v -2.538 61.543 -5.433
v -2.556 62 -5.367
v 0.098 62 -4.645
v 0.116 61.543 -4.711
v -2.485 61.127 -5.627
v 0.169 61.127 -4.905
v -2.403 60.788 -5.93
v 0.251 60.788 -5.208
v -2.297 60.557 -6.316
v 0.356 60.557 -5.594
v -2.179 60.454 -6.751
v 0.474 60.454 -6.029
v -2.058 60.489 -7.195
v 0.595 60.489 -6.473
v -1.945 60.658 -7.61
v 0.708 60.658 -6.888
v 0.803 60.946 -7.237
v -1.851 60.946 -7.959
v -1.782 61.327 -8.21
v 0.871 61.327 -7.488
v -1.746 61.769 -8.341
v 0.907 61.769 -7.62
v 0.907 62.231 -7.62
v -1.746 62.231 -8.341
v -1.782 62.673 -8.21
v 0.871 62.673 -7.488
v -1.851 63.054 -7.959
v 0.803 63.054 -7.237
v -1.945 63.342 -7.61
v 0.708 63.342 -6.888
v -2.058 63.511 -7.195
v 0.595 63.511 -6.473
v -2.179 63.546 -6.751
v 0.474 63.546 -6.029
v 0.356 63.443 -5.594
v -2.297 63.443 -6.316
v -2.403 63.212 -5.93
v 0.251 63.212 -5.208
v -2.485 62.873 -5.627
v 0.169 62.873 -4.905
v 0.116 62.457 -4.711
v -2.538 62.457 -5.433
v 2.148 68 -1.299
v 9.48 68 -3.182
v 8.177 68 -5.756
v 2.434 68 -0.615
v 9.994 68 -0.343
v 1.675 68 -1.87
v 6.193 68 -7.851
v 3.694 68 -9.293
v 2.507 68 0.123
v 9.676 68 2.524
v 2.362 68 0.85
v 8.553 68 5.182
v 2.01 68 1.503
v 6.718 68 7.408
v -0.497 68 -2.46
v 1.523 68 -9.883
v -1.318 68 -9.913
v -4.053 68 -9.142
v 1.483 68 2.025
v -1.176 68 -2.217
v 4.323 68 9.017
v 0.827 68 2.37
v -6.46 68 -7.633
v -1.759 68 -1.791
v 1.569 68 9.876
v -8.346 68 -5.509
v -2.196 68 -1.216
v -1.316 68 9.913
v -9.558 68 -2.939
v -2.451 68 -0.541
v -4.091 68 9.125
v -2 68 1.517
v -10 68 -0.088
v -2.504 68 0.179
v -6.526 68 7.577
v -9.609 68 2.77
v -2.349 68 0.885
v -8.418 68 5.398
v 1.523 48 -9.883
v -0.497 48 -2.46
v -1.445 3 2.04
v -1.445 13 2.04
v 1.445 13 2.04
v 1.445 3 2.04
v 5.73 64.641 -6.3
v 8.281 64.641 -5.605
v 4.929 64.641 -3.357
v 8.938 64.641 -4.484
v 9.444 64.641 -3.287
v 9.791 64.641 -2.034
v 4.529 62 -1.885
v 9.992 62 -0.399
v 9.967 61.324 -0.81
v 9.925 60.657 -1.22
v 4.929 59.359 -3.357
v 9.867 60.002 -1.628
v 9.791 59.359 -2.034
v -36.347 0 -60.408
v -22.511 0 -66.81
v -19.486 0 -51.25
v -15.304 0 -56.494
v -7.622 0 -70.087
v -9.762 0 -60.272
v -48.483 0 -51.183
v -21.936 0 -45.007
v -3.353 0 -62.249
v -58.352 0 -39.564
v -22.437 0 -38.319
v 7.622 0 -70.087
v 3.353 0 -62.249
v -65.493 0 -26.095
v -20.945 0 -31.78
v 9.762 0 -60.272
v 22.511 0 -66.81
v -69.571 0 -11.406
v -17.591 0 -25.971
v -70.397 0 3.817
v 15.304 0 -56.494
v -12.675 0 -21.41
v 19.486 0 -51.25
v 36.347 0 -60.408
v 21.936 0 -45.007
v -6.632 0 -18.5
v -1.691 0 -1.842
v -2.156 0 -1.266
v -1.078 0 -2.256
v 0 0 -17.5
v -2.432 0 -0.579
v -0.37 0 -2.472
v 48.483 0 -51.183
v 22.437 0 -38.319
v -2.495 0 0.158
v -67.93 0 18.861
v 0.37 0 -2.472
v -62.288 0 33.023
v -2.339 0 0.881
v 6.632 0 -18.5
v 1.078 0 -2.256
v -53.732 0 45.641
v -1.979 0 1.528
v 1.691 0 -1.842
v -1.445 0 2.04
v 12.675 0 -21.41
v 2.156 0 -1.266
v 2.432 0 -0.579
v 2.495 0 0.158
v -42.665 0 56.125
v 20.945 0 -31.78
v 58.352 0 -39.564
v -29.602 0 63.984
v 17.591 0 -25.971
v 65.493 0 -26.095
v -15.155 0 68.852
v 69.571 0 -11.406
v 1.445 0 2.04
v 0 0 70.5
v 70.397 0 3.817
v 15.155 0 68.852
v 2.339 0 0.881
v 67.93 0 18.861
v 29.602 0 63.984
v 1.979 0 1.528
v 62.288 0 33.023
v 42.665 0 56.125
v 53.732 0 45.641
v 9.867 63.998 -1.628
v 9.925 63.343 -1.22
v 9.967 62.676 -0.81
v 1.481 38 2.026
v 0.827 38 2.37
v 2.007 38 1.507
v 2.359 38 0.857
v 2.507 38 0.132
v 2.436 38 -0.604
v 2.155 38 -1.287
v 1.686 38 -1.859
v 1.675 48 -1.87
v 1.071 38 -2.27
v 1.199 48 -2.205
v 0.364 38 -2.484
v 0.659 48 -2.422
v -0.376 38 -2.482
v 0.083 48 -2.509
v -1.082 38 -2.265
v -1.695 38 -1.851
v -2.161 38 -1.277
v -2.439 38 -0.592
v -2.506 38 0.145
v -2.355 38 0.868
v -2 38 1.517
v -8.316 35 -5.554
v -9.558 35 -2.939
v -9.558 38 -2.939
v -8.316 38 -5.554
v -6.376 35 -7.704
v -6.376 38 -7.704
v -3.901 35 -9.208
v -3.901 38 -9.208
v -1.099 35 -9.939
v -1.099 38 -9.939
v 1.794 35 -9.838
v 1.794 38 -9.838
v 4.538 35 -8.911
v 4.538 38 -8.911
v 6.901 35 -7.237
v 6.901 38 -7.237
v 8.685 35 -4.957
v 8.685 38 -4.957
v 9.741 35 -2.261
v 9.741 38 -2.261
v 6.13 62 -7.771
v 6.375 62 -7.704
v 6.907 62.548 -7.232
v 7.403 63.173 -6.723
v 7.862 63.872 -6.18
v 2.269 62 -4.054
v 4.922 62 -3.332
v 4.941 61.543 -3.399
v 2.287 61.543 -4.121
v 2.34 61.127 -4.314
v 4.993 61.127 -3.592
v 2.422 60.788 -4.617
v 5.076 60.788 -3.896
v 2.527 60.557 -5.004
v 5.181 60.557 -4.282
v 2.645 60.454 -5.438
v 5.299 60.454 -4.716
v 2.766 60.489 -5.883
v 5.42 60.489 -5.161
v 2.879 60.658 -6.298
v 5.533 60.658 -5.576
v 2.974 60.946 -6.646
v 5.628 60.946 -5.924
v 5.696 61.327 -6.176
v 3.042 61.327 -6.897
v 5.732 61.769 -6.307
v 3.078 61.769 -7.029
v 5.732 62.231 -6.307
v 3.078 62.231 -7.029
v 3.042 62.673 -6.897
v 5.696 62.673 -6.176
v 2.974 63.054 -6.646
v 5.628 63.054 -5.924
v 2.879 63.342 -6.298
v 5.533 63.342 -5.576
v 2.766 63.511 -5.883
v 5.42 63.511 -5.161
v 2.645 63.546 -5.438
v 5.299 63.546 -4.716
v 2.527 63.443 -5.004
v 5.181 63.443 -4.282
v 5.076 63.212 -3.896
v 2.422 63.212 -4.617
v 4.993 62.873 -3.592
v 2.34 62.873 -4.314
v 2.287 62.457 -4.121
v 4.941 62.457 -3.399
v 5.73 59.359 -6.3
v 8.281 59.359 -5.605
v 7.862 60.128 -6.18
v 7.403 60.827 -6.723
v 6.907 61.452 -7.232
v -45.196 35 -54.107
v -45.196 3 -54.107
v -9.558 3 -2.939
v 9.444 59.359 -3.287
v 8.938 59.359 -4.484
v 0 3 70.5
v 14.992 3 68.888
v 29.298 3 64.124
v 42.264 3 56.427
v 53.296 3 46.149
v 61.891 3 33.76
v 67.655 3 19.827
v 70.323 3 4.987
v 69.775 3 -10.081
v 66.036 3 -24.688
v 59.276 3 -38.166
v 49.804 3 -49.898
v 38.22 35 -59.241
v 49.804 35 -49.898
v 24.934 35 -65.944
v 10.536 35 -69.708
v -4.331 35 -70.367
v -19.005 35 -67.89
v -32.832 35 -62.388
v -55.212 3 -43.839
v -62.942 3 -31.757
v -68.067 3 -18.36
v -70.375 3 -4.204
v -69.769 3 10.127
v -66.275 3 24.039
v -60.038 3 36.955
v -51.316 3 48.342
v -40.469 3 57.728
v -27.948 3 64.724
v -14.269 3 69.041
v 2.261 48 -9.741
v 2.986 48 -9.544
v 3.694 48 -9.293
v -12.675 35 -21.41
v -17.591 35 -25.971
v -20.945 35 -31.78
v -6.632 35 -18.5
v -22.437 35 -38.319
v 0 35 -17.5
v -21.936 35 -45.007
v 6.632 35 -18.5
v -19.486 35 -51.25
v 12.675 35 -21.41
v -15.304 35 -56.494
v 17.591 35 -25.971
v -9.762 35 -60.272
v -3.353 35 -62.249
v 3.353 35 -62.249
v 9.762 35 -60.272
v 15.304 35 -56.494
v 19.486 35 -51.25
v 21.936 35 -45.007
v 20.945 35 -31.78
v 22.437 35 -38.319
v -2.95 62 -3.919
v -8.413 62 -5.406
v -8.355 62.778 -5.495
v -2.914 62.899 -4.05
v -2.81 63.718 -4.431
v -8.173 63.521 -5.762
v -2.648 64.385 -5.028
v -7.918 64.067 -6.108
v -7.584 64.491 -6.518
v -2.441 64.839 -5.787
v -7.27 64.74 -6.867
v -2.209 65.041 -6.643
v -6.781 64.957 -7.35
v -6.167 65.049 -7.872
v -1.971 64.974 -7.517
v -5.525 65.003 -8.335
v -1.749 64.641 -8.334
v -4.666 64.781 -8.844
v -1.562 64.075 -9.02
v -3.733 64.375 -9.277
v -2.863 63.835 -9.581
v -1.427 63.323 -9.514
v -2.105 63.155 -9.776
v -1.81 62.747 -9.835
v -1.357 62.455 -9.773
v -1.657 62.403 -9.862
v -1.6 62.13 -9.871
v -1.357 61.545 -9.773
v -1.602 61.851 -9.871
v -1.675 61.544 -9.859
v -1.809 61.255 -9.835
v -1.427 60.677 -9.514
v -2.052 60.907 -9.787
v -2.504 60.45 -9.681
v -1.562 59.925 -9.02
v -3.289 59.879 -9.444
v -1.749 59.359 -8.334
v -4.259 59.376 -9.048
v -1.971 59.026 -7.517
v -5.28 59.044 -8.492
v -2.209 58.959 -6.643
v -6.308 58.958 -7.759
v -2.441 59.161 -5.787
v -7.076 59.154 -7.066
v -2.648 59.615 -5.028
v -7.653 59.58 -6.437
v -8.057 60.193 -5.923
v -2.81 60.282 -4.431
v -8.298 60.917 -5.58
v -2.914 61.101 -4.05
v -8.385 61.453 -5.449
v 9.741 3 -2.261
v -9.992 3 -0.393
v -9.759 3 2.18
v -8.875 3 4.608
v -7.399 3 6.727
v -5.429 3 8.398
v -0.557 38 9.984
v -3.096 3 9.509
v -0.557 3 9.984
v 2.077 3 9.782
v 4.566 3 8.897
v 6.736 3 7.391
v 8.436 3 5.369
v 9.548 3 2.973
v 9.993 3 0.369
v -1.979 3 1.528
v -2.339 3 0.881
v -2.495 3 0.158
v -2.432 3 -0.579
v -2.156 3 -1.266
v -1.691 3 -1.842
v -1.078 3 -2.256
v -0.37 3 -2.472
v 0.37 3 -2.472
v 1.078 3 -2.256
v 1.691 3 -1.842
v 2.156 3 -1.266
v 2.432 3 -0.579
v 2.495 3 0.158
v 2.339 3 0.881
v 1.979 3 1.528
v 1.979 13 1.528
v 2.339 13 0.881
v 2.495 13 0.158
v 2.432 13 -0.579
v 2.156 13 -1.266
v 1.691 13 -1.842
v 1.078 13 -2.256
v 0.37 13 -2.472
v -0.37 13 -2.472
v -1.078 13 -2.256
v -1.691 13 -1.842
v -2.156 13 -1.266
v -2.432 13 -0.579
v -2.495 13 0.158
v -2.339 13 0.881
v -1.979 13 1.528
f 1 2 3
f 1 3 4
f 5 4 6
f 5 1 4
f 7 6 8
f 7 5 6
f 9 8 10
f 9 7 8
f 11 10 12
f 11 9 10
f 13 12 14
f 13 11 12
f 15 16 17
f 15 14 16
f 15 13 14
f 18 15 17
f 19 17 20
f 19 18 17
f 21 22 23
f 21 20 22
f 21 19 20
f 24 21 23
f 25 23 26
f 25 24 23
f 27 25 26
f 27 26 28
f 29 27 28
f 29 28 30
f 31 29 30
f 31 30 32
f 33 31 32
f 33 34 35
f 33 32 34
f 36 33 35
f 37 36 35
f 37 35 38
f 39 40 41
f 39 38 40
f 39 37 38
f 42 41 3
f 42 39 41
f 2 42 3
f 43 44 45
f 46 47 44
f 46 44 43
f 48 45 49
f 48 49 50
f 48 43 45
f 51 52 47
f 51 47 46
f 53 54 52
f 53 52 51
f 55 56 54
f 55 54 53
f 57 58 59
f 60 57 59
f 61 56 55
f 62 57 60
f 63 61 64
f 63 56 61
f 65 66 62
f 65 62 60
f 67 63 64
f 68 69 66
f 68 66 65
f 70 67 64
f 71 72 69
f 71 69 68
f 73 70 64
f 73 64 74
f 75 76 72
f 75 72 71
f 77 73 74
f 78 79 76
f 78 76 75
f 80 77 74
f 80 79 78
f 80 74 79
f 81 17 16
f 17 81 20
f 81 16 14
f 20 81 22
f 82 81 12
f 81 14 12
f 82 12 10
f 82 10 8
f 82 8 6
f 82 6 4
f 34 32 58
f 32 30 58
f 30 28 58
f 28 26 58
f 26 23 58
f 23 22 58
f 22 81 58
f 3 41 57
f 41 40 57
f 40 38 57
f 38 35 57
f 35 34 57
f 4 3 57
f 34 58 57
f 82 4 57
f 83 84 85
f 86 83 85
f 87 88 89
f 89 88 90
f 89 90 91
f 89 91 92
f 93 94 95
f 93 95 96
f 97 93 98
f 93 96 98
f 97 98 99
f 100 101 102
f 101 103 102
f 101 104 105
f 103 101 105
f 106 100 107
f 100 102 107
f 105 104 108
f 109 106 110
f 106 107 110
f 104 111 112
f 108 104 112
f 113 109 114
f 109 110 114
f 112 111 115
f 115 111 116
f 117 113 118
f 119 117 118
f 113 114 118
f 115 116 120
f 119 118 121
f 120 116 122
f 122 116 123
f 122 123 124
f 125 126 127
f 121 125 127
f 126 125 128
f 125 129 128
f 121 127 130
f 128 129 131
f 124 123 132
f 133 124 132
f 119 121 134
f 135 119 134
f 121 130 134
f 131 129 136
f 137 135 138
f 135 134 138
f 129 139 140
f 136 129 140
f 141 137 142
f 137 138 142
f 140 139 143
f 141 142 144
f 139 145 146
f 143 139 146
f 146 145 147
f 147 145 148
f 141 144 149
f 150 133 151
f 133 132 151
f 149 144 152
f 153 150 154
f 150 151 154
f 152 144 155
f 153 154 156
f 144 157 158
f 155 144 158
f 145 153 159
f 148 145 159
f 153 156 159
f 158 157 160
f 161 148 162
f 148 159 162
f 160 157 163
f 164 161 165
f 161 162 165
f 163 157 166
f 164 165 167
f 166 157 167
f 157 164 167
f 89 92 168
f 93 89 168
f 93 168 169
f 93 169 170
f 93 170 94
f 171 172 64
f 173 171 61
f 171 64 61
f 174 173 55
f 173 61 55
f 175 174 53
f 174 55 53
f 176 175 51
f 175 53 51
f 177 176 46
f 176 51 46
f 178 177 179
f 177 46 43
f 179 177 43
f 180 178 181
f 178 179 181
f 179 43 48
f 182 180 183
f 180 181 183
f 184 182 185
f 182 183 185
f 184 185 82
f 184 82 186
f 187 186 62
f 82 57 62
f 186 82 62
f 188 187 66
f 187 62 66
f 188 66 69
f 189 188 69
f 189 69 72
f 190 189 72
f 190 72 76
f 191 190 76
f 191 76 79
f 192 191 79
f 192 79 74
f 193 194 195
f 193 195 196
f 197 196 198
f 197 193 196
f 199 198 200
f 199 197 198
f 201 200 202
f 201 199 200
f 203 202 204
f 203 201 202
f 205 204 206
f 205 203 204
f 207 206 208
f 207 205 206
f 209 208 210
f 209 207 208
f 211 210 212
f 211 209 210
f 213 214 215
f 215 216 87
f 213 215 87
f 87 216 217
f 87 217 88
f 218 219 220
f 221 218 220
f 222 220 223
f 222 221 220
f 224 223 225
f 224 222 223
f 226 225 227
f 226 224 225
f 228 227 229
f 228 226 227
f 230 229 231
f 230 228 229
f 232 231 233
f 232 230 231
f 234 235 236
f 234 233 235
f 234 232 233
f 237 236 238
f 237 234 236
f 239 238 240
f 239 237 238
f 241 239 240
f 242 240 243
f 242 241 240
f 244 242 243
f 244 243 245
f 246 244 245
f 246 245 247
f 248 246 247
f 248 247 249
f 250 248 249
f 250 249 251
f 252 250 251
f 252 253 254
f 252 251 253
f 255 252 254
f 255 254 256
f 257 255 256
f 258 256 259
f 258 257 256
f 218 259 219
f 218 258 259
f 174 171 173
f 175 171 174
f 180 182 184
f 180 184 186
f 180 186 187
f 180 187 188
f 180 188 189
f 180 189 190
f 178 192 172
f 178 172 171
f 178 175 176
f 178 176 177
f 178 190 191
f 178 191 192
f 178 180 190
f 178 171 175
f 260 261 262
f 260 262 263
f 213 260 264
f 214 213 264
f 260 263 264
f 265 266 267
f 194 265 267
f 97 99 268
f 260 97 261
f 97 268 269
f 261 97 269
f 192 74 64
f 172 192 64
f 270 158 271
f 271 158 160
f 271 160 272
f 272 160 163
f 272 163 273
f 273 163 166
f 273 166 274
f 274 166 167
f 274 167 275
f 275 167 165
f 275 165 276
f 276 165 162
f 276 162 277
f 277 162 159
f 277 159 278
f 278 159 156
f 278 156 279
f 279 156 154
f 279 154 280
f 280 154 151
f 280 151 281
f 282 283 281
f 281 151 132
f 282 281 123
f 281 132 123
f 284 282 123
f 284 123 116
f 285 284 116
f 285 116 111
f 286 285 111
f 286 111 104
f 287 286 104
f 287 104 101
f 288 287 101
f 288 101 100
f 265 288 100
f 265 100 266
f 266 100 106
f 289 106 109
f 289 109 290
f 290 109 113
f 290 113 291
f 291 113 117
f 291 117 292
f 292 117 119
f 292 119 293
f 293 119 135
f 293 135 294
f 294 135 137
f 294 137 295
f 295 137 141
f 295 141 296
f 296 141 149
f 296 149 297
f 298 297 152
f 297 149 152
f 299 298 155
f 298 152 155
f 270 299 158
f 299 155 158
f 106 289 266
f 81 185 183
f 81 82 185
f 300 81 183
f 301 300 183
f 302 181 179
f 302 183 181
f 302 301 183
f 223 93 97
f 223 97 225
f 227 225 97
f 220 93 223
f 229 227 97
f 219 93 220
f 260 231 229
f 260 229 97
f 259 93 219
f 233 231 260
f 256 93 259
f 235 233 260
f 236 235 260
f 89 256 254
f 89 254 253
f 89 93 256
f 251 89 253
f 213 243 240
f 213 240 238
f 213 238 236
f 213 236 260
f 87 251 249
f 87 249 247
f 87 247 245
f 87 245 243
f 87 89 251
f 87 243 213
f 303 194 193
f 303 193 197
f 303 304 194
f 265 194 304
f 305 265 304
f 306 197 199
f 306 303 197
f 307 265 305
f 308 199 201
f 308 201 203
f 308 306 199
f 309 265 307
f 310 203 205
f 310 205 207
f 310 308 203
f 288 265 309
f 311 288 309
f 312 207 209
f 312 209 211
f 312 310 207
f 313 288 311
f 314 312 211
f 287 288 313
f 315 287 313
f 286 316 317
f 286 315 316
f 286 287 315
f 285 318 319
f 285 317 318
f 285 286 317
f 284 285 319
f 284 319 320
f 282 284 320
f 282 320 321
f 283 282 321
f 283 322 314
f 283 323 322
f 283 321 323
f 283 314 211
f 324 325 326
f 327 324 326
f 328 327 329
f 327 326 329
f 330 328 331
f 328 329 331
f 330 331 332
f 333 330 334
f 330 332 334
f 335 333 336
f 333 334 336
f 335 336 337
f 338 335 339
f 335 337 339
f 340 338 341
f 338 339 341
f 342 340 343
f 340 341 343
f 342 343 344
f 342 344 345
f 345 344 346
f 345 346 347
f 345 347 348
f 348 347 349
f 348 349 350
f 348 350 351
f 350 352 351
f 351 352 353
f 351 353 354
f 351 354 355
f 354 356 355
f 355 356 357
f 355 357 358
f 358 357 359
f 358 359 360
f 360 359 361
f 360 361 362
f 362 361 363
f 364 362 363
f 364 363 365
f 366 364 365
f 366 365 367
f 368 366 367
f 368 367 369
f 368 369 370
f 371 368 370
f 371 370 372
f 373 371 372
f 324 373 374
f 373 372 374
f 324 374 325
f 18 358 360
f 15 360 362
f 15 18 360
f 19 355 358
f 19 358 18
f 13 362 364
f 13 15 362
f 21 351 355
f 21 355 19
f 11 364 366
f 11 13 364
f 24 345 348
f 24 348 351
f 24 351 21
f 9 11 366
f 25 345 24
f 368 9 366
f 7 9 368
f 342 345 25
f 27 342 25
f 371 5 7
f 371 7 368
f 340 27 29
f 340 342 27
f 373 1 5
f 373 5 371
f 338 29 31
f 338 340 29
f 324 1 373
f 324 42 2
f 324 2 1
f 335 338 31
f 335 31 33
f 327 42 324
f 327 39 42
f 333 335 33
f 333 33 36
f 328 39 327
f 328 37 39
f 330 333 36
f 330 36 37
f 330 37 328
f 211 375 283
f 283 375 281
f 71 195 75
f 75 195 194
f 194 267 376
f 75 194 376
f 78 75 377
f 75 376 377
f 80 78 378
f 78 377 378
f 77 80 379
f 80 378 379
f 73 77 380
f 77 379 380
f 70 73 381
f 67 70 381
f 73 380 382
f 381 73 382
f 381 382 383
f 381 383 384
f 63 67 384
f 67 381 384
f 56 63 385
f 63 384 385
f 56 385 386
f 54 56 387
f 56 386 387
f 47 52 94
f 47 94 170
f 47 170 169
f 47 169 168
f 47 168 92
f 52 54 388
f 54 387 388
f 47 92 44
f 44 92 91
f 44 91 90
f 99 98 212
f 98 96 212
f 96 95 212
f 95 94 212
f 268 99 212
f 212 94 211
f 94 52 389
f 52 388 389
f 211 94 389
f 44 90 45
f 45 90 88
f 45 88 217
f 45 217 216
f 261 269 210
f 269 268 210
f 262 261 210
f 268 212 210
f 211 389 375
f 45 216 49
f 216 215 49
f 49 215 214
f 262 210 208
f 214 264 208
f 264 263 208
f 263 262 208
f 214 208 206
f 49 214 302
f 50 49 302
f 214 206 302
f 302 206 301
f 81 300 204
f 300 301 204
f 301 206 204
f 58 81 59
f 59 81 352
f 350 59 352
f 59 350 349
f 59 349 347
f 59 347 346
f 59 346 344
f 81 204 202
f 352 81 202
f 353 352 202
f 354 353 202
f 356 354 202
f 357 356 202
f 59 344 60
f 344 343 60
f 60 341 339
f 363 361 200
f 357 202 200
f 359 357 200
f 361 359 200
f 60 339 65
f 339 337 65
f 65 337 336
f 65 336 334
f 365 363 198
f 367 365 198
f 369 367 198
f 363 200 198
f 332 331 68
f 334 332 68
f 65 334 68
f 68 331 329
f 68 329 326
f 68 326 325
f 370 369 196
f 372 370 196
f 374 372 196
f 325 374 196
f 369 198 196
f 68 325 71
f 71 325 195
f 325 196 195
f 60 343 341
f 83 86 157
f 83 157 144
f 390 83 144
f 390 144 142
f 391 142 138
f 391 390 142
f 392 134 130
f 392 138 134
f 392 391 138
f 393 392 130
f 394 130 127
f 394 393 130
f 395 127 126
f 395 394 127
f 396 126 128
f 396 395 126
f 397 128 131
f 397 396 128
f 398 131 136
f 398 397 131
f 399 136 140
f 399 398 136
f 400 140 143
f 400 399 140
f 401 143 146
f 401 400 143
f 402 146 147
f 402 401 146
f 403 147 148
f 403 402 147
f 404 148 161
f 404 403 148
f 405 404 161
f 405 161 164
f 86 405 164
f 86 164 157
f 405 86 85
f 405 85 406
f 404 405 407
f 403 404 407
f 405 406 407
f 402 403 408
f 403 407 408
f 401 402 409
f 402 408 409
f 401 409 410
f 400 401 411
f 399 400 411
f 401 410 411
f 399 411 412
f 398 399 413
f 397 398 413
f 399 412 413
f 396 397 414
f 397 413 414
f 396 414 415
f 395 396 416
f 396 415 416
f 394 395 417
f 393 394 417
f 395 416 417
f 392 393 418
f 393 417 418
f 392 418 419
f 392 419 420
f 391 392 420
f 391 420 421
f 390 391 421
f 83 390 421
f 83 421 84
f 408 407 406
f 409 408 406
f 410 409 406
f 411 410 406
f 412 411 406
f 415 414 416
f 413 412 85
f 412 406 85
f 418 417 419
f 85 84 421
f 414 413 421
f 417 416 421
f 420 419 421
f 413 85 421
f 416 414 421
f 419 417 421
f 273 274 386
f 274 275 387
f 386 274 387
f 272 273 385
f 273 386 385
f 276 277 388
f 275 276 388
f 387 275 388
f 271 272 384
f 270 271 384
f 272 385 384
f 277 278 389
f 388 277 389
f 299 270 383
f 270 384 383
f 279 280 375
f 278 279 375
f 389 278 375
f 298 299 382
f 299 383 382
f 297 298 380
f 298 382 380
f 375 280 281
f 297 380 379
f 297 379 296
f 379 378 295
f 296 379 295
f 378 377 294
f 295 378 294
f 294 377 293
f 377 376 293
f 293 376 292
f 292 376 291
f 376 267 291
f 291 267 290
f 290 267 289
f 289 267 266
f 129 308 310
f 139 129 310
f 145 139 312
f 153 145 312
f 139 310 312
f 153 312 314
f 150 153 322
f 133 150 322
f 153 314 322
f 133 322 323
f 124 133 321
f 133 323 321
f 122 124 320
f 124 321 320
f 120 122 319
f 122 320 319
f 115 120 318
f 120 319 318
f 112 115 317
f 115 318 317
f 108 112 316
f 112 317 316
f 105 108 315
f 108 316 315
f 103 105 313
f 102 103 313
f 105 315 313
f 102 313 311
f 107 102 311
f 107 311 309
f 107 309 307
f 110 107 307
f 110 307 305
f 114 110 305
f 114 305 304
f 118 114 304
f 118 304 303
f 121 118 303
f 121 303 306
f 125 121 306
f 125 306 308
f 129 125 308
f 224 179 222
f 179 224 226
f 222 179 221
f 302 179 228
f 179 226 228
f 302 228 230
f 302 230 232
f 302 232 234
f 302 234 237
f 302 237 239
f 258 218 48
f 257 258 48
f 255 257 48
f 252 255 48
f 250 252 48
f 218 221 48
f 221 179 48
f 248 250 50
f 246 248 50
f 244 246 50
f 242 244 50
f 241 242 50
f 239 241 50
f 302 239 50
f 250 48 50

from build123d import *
from build123d.topology import SkipClean

# Parameters (mm, degrees)
SKETCH3_R               = 70.5
BOSS_EXTRUDE2_DEPTH     = 38
SKETCH4_R               = 22.5
CUT_EXTRUDE1_DEPTH      = 89
CUT_EXTRUDE2_START      = -35
CUT_EXTRUDE2_DEPTH      = 35
SKETCH8_R               = 10
BOSS_EXTRUDE3_DEPTH     = 65
CUT_EXTRUDE4_DEPTH      = 30
CUT_EXTRUDE5_START      = -3
CUT_EXTRUDE5_DEPTH      = 3
CUT_EXTRUDE6_START      = -10
CUT_EXTRUDE6_DEPTH      = 10
CUT_EXTRUDE7_DEPTH      = 20
CUT_EXTRUDE9_DEPTH      = 12
CUT_EXTRUDE9_DEPTH_BACK = 12
SKETCH14_R              = 1.55
CUT_EXTRUDE10_DEPTH     = 7
SKETCH16_R              = 3.05
CUT_EXTRUDE11_DEPTH     = 7


with BuildPart() as part:
    # Sketch3 → Boss-Extrude2 (new body)
    with BuildSketch(Plane(origin=(0, 0, 0), x_dir=(1, 0, 0), z_dir=(0, 1, 0))):
        Circle(SKETCH3_R)
    extrude(amount=BOSS_EXTRUDE2_DEPTH)

    # Sketch4 → Cut-Extrude1 (cut)
    with BuildSketch(Plane(origin=(0, 38, 0), x_dir=(1, 0, 0), z_dir=(0, 1, 0))):
        with Locations((0, 40)):
            Circle(SKETCH4_R)
        with BuildLine():
            Line((1.445129752, -2.04), (-1.445129752, -2.04))
            ThreePointArc((-1.445129752, -2.04), (0, 2.5), (1.445129752, -2.04))
        make_face()
    extrude(amount=-CUT_EXTRUDE1_DEPTH, mode=Mode.SUBTRACT)

    # Sketch6 → Cut-Extrude2 (cut)
    with BuildSketch(Plane(origin=(0, 38, 0), x_dir=(1, 0, 0), z_dir=(0, 1, 0)).offset(CUT_EXTRUDE2_START)):
        with BuildLine():
            Line((-45.196231291, 54.106845011), (-0.557111742, -9.984469265))
            Line((-0.557111742, -9.984469265), (49.803768709, 49.898242679))
            ThreePointArc((49.803768709, 49.898242679), (-3.120165646, -70.430920527), (-45.196231291, 54.106845011))
        make_face()
    extrude(amount=CUT_EXTRUDE2_DEPTH, mode=Mode.SUBTRACT)

    # Sketch8 → Boss-Extrude3 (add)
    with BuildSketch(Plane(origin=(0, 3, 0), x_dir=(1, 0, 0), z_dir=(0, 1, 0))):
        Circle(SKETCH8_R)
    extrude(amount=BOSS_EXTRUDE3_DEPTH)

    # Sketch10 → Cut-Extrude4 (cut)
    with BuildSketch(Plane(origin=(0, 68, 0), x_dir=(1, 0, 0), z_dir=(0, 1, 0))):
        with BuildLine():
            Line((-1.99989737, -1.516743389), (0.826538727, -2.370007117))
            ThreePointArc((0.826538727, -2.370007117), (0.725401526, 2.402892554), (-1.99989737, -1.516743389))
        make_face()
    extrude(amount=-CUT_EXTRUDE4_DEPTH, mode=Mode.SUBTRACT)

    # Sketch11 → Cut-Extrude5 (cut)
    with SkipClean():  # the faces are left unmerged after this step: merging them gives an invalid solid
        with BuildSketch(Plane(origin=(0, 38, 0), x_dir=(1, 0, 0), z_dir=(0, 1, 0)).offset(CUT_EXTRUDE5_START)):
            with BuildLine():
                Line((-45.196231291, 54.106845011), (-9.558315606, 2.939150008))
                ThreePointArc((-9.558315606, 2.939150008), (0.351258268, 9.993828977), (9.741081782, 2.260824122))
                Line((9.741081782, 2.260824122), (49.803768709, 49.898242679))
                ThreePointArc((49.803768709, 49.898242679), (3.120165646, 70.430920527), (-45.196231291, 54.106845011))
            make_face()
        extrude(amount=CUT_EXTRUDE5_DEPTH, mode=Mode.SUBTRACT)

    # Sketch12 → Cut-Extrude6 (cut)
    with SkipClean():  # the faces are left unmerged after this step: merging them gives an invalid solid
        with BuildSketch(Plane.XZ.offset(-3).offset(CUT_EXTRUDE6_START)):
            with BuildLine():
                Line((-1.445129752, 2.04), (1.445129752, 2.04))
                ThreePointArc((1.445129752, 2.04), (0, -2.5), (-1.445129752, 2.04))
            make_face()
        extrude(amount=CUT_EXTRUDE6_DEPTH, mode=Mode.SUBTRACT)

    # Sketch13 → Cut-Extrude7 (cut)
    with SkipClean():  # the faces are left unmerged after this step: merging them gives an invalid solid
        with BuildSketch(Plane(origin=(0, 68, 0), x_dir=(1, 0, 0), z_dir=(0, 1, 0))):
            Polygon((-0.496518118, 2.460400325), (1.674568679, 1.86973788), (3.774701815, 9.5891576), (1.603615019, 10.179820045), align=None)
        extrude(amount=-CUT_EXTRUDE7_DEPTH, mode=Mode.SUBTRACT)

    # Sketch14 → Cut-Extrude9 (cut, two sides: drawn at the far end of the back side and taken through both)
    with SkipClean():  # the faces are left unmerged after this step: merging them gives an invalid solid
        with BuildSketch(Plane(origin=(-1.085543398, 0, -0.295331222), x_dir=(0.2625166420985644, 0, -0.9649274649533479), z_dir=(0.9649274649533479, 0, 0.2625166420985644)).offset(-CUT_EXTRUDE9_DEPTH_BACK)):
            with Locations((6.057727773, 62)):
                Circle(SKETCH14_R)
        extrude(amount=CUT_EXTRUDE9_DEPTH + CUT_EXTRUDE9_DEPTH_BACK, mode=Mode.SUBTRACT)

    # Sketch15 → Cut-Extrude10 (cut)
    with SkipClean():  # the faces are left unmerged after this step: merging them gives an invalid solid
        with BuildSketch(Plane(origin=(10.493586181, 0, 2.854868483), x_dir=(0.2625166420985644, 0, -0.9649274649533479), z_dir=(0.9649274649533479, 0, 0.2625166420985644))):
            Polygon((9.107727773, 62), (7.582727773, 64.641377482), (4.532727773, 64.641377482), (3.007727773, 62), (4.532727773, 59.358622518), (7.582727773, 59.358622518), align=None)
        extrude(amount=-CUT_EXTRUDE10_DEPTH, mode=Mode.SUBTRACT)

    # Sketch16 → Cut-Extrude11 (cut)
    with SkipClean():  # the faces are left unmerged after this step: merging them gives an invalid solid
        with BuildSketch(Plane(origin=(-10.493586181, 0, -2.854868483), x_dir=(-0.26251664209856435, 0, 0.9649274649533478), z_dir=(-0.9649274649533478, 0, -0.26251664209856435))):
            with Locations((-6.057727773, 62)):
                Circle(SKETCH16_R)
        extrude(amount=-CUT_EXTRUDE11_DEPTH, mode=Mode.SUBTRACT)


solid = part.part
